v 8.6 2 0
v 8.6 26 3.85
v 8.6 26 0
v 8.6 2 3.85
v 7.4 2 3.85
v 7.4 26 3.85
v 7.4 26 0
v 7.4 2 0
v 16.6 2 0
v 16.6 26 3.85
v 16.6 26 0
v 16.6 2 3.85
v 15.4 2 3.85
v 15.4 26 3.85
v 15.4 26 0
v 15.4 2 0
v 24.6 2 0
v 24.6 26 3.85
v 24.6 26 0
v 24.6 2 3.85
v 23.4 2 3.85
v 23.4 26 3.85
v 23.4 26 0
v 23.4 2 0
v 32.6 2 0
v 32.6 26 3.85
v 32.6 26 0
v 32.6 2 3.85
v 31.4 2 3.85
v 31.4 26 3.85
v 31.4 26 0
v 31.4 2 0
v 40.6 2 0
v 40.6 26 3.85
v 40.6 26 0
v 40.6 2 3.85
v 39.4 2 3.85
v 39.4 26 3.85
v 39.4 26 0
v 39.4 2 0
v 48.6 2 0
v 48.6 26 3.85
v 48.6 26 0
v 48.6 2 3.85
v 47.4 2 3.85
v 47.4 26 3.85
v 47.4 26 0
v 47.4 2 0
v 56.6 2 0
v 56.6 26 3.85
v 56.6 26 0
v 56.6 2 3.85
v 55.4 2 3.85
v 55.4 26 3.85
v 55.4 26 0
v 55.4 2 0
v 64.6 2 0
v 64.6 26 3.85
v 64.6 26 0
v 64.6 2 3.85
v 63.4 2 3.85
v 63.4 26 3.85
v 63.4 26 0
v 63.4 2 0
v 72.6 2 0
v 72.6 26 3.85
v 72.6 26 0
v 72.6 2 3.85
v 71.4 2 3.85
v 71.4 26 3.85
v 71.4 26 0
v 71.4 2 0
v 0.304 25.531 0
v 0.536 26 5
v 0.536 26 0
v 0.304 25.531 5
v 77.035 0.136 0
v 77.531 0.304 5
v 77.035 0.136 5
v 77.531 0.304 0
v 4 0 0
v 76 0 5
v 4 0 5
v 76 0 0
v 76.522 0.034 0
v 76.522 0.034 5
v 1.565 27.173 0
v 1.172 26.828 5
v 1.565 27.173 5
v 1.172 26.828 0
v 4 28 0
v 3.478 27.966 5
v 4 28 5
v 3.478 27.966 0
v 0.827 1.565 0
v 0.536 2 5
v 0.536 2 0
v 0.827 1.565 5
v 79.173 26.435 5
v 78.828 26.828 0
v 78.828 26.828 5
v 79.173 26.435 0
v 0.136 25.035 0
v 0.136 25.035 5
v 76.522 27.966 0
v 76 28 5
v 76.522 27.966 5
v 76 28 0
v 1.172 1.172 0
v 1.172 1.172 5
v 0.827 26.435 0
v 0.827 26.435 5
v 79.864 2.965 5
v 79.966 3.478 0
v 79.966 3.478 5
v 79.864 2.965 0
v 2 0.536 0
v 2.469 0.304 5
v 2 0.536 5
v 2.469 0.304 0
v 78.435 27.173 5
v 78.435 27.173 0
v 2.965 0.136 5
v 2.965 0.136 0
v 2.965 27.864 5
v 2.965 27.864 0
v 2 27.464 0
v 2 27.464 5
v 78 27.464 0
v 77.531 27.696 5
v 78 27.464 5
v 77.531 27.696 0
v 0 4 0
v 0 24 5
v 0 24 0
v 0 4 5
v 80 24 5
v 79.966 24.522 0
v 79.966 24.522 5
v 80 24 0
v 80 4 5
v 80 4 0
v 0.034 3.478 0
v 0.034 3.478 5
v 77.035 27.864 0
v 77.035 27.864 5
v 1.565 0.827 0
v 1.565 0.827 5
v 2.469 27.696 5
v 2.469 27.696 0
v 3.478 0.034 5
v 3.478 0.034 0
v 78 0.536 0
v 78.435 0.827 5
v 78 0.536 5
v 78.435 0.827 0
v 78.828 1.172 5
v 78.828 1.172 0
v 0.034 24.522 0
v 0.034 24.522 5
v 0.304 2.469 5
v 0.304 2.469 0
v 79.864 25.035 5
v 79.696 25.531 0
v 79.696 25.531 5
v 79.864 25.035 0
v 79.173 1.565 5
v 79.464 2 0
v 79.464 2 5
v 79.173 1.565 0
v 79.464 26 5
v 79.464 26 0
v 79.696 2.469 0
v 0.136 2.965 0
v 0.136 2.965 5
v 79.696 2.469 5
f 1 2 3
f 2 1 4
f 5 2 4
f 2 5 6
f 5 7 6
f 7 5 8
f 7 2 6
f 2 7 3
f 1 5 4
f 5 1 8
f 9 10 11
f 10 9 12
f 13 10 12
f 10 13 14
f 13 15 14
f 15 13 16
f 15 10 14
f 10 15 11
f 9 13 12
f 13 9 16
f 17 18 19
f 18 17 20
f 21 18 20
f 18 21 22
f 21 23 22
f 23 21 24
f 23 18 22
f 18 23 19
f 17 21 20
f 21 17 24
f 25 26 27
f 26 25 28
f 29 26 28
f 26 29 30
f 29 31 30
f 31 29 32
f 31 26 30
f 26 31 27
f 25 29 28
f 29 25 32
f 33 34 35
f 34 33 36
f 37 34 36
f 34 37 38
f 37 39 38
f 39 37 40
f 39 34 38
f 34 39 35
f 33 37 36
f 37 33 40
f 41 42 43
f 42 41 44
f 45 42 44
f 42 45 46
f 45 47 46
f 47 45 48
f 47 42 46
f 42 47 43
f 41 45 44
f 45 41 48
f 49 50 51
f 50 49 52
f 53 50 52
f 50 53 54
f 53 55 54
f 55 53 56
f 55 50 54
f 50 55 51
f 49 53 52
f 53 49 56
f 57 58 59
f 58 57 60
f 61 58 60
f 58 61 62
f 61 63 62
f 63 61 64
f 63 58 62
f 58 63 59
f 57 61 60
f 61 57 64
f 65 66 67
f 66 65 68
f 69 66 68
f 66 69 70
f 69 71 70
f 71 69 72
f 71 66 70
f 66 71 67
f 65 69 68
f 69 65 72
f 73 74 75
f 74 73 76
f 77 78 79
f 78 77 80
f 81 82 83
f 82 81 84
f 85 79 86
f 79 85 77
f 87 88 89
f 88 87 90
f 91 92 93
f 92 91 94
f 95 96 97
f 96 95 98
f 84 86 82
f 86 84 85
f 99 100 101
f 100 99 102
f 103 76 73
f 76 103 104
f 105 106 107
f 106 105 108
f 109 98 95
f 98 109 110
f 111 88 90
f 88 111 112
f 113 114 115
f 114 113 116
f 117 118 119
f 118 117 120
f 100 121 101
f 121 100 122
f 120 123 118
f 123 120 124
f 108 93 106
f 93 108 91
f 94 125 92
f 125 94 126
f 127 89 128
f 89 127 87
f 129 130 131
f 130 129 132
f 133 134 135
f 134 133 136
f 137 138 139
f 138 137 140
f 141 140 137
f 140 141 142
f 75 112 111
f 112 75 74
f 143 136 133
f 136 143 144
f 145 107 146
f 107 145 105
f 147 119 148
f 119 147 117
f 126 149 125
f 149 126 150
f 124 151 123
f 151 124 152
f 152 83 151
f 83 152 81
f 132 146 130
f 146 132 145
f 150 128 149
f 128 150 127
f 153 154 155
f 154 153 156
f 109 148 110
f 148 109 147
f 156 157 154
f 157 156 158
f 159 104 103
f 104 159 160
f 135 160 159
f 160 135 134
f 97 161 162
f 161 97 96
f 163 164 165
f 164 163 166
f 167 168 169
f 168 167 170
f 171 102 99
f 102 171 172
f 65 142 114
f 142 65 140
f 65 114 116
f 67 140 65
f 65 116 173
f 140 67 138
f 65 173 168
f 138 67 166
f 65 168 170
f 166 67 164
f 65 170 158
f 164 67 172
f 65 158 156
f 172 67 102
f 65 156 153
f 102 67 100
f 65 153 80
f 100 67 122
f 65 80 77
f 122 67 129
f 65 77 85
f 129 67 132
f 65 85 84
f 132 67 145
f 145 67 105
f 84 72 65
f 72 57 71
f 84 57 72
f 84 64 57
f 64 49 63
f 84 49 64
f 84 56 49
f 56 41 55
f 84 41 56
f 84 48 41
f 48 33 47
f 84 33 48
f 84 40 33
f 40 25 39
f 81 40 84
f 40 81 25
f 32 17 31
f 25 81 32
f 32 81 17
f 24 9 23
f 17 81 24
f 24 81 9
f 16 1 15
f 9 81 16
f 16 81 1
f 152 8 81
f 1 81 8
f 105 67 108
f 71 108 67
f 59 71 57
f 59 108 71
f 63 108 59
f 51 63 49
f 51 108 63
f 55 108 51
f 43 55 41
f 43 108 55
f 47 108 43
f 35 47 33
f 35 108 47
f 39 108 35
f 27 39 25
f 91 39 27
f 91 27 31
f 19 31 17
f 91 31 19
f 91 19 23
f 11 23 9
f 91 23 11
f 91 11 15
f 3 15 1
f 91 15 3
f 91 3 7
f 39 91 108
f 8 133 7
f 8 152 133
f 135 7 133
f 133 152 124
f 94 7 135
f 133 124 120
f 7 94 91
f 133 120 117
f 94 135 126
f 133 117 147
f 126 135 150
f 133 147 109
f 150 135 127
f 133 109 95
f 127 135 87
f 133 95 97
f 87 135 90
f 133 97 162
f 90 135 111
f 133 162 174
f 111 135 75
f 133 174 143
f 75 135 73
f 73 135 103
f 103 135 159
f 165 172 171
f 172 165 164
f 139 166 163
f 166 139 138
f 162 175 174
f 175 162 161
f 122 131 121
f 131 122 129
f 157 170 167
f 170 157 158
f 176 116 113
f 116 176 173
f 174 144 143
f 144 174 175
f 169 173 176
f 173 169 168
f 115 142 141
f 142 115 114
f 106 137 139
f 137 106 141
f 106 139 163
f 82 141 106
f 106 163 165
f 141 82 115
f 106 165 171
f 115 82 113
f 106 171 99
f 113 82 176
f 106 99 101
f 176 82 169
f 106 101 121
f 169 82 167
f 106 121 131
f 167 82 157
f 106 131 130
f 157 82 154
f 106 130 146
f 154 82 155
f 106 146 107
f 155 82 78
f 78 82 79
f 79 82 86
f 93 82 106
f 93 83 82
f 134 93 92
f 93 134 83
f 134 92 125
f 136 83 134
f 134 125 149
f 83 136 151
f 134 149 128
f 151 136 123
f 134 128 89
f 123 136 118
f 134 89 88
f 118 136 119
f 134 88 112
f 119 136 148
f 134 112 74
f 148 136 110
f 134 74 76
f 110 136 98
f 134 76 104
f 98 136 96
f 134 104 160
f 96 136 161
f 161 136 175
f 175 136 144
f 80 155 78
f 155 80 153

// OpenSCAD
// file: ../latches/magnetic.scad
// latches/magnetic.scad — small puck on each band end holding a glued-in
// 6 mm × 2 mm neodymium disc magnet.
// MIT licensed.
//
// Convention: end="left" places a puck at origin extending +X into the band
// (centered at MAGNET_POCKET_INSET from x=0); end="right" places a puck
// extending -X from origin (centered at -MAGNET_POCKET_INSET). The caller
// translates the right invocation to band_length so it sits inside the band's
// right end.
//
// Print orientation: pocket opens UP (toward +Z) so the magnet drops in from
// above. The user glues with cyanoacrylate. Polarity is the user's
// responsibility — mark each magnet before gluing because you cannot reverse
// it once cured.

MAGNET_DIAMETER     = 6;     // mm
MAGNET_THICKNESS    = 2;     // mm
MAGNET_TOLERANCE    = 0.3;   // mm of slack so the magnet drops in cleanly
MAGNET_PUCK_R       = 5.5;   // mm — puck around the pocket
MAGNET_PUCK_HEIGHT  = 2.6;   // mm above the band
MAGNET_PUCK_INSET   = 8;     // mm — puck center from the band end

module _magnet_puck(band_thickness) {
    // puck sits ON TOP of the band at z = band_thickness, with a downward-
    // opening cylinder removed for the magnet (opening on the puck's TOP face
    // because the puck sits proud of the band — the pocket can open up
    // without breaching the band).
    difference() {
        translate([0, 0, band_thickness])
            cylinder(h = MAGNET_PUCK_HEIGHT, r = MAGNET_PUCK_R);
        // pocket opens at the top of the puck, sunk down to leave a thin floor
        floor_thickness = max(MAGNET_PUCK_HEIGHT - MAGNET_THICKNESS, 0.4);
        translate([0, 0, band_thickness + floor_thickness])
            cylinder(h = MAGNET_THICKNESS + 0.1,
                     d = MAGNET_DIAMETER + MAGNET_TOLERANCE);
    }
}

module latch_magnetic(band_width, band_thickness, end = "both") {
    if (end == "left" || end == "both") {
        translate([MAGNET_PUCK_INSET, band_width / 2, 0])
            _magnet_puck(band_thickness);
    }
    if (end == "right" || end == "both") {
        translate([-MAGNET_PUCK_INSET, band_width / 2, 0])
            _magnet_puck(band_thickness);
    }
}

latch_magnetic(22, 3);
// file: ../latches/friction_overlap.scad
// latches/friction_overlap.scad — no hardware, ends overlap and TPU-on-TPU grip
// holds.
// MIT licensed.
//
// Adds a small taper at both ends (thinner) so the overlap zone doesn't
// double the wrist's wrap diameter visibly. Adjustable by sliding.

module latch_friction_overlap(band_width, band_thickness) {
    taper_l = 18;  // mm of taper into each end

    // left end taper: shrink to half thickness over taper_l
    translate([0, 0, 0])
        rotate([0, 0, 180])
            linear_extrude(height = band_thickness, scale = [0.6, 1.0])
                square([0.01, band_width], center = false);

    // The above is just a visual hint — the actual taper is handled by the
    // band itself; this module is intentionally minimal because friction
    // overlap requires NO added hardware.
}

// development render
latch_friction_overlap(22, 3);
// file: ../latches/loop_post.scad
// latches/loop_post.scad — loop frame on one end, T-post on the other.
// MIT licensed.
//
// Convention: end="left" places a small T-headed post UP from the band's top
// surface at x=0; end="right" places a loop-frame extending +X past the
// band end. When worn, the loop-frame slips over the T-post and the post's
// head captures it.

LOOP_POST_DIAMETER     = 5;     // mm — post shaft diameter
LOOP_POST_HEIGHT       = 7;     // mm — post total height
LOOP_POST_HEAD_R       = 4;     // mm — T-head radius (wider than shaft so the loop is captured)
LOOP_FRAME_LENGTH      = 18;    // mm — frame extends past band end
LOOP_FRAME_INNER_W     = 8;     // mm — inner cutout width (must clear post head)
LOOP_FRAME_INNER_L     = 10;    // mm — inner cutout length
LOOP_FRAME_WALL        = 2.5;   // mm

module latch_loop_post(band_width, band_thickness, end = "both") {
    if (end == "left" || end == "both") {
        // T-headed post centered on the band's top surface near x = 0
        translate([0, band_width / 2, band_thickness]) {
            cylinder(h = LOOP_POST_HEIGHT - 1.2, d = LOOP_POST_DIAMETER);
            translate([0, 0, LOOP_POST_HEIGHT - 1.2])
                cylinder(h = 1.2,
                         r1 = LOOP_POST_DIAMETER / 2,
                         r2 = LOOP_POST_HEAD_R);
        }
    }
    if (end == "right" || end == "both") {
        // Loop frame extending +X past the band end
        frame_w = band_width * 0.8;
        translate([0, (band_width - frame_w) / 2, 0])
            difference() {
                // outer rounded-rect
                linear_extrude(height = band_thickness)
                    offset(r = 3) offset(delta = -3)
                        square([LOOP_FRAME_LENGTH, frame_w]);
                // inner cutout for the loop
                translate([
                    (LOOP_FRAME_LENGTH - LOOP_FRAME_INNER_L) / 2,
                    (frame_w - LOOP_FRAME_INNER_W) / 2,
                    -0.1
                ])
                    linear_extrude(height = band_thickness + 0.2)
                        offset(r = 1.5) offset(delta = -1.5)
                            square([LOOP_FRAME_INNER_L, LOOP_FRAME_INNER_W]);
            }
    }
}

latch_loop_post(22, 3);
// file: ../latches/snap.scad
// latches/snap.scad — printed peg-and-socket snap closure.
// MIT licensed.
//
// Convention: end="left" extends in -X from origin; end="right" extends in +X.
// Caller places at x=0 for left and translates to band_length for right.
//
// Both ends have a flat tab extending past the band edge. The LEFT tab has
// a small peg pointing up; the RIGHT tab has a matching socket on its
// underside. When worn, the right tab lays on top of the left tab and the
// peg snaps into the socket.

SNAP_TAB_LENGTH    = 14;   // mm — how far the tab extends past the band
SNAP_PEG_DIAMETER  = 4;    // mm
SNAP_PEG_HEIGHT    = 2.5;  // mm — pegs head sticks above the tab top
SNAP_PEG_HEAD_R    = 2.6;  // mm — flared head, slightly wider than the shaft

module _snap_tab(band_width, band_thickness, direction) {
    // direction = -1 for left (extends -X) or +1 for right (extends +X)
    tab_w = band_width * 0.7;
    x0 = direction == -1 ? -SNAP_TAB_LENGTH : 0;
    translate([x0, (band_width - tab_w) / 2, 0])
        linear_extrude(height = band_thickness)
            offset(r = 3) offset(delta = -3)
                square([SNAP_TAB_LENGTH, tab_w]);
}

module latch_snap(band_width, band_thickness, end = "both") {
    if (end == "left" || end == "both") {
        // tab extends -X
        _snap_tab(band_width, band_thickness, direction = -1);
        // peg pointing up at the tab's tip
        translate([-SNAP_TAB_LENGTH * 0.65, band_width / 2, band_thickness])
            union() {
                cylinder(h = SNAP_PEG_HEIGHT * 0.7, d = SNAP_PEG_DIAMETER);
                translate([0, 0, SNAP_PEG_HEIGHT * 0.7])
                    cylinder(h = SNAP_PEG_HEIGHT * 0.3,
                             r1 = SNAP_PEG_DIAMETER / 2,
                             r2 = SNAP_PEG_HEAD_R);
            }
    }
    if (end == "right" || end == "both") {
        // tab extends +X, with a socket cavity in the underside at the tip
        difference() {
            _snap_tab(band_width, band_thickness, direction = +1);
            // socket: cylindrical cavity sized slightly larger than the peg
            // head, opening downward from z=0 (underside of the tab)
            translate([SNAP_TAB_LENGTH * 0.65, band_width / 2, -0.01])
                cylinder(h = band_thickness * 0.7,
                         d = SNAP_PEG_HEAD_R * 2 + 0.4);
        }
    }
}

latch_snap(22, 3);
// file: ../latches/buckle.scad
// latches/buckle.scad — pin-through-hole buckle, leather-bracelet authentic.
// MIT licensed.
//
// One end gets the frame + pin; the other end gets a tongue with a row of
// holes. Caller invokes once at each end with end="left" or end="right".
//
// LEARNING-MODE NOTE: hole count and spacing is a UX call. Defaults below
// give 5 holes at 5 mm spacing => 20 mm of size adjustability. Goth subculture
// tends to want fewer, wider holes; festival use wants more, tighter holes.
// To tune, change BUCKLE_HOLES and BUCKLE_HOLE_SPACING. If you change them,
// also update src/open_studs/params.py to match (drift test will fail
// otherwise once Push 2 lands).

BUCKLE_HOLES         = 5;     // count of adjustment holes
BUCKLE_HOLE_SPACING  = 5;     // mm center-to-center
BUCKLE_HOLE_DIAMETER = 3.5;   // mm — sized to the printed pin
BUCKLE_PIN_DIAMETER  = 3.2;   // mm — slightly under hole for friction
BUCKLE_FRAME_LENGTH  = 12;    // mm — length of the buckle frame
BUCKLE_TONGUE_LENGTH = 35;    // mm — length of the tongue past the band

module latch_buckle(band_width, band_thickness, end = "both") {
    if (end == "left" || end == "both")  buckle_frame(band_width, band_thickness);
    if (end == "right" || end == "both") buckle_tongue(band_width, band_thickness);
}

module buckle_frame(band_width, band_thickness) {
    // a rectangular frame sitting at x=0, extending into -X by BUCKLE_FRAME_LENGTH.
    // pin runs across in Y.
    frame_w = band_width + 4;
    frame_l = BUCKLE_FRAME_LENGTH;
    wall    = 2.5;
    bar_d   = BUCKLE_PIN_DIAMETER;

    translate([-frame_l, -2, 0]) {
        difference() {
            // outer block
            cube([frame_l, frame_w, band_thickness]);
            // inner cutout
            translate([wall, wall, -0.1])
                cube([frame_l - 2 * wall, frame_w - 2 * wall, band_thickness + 0.2]);
        }
        // pin bar across the middle
        translate([frame_l / 2, 0, band_thickness / 2])
            rotate([-90, 0, 0])
                cylinder(h = frame_w, d = bar_d, $fn = 24);
    }
}

module buckle_tongue(band_width, band_thickness) {
    // a tongue at x=0 (right end of band) extending +X by BUCKLE_TONGUE_LENGTH,
    // with BUCKLE_HOLES holes punched through.
    tongue_w = band_width * 0.7;
    tongue_l = BUCKLE_TONGUE_LENGTH;

    difference() {
        translate([0, (band_width - tongue_w) / 2, 0])
            linear_extrude(height = band_thickness)
                offset(r = 3) offset(delta = -3)
                    square([tongue_l, tongue_w]);

        // adjustment holes, centered on the tongue, spaced from the band end
        hole_start = 10;
        for (i = [0 : BUCKLE_HOLES - 1])
            translate([hole_start + i * BUCKLE_HOLE_SPACING, band_width / 2, -0.1])
                cylinder(h = band_thickness + 0.2, d = BUCKLE_HOLE_DIAMETER);
    }
}

// development render — show the frame end on a stub of band so you can see
// how it sits.
*latch_buckle(22, 3, end = "both");
translate([0, 0, 0]) cube([60, 22, 3]);  // visible band stub
latch_buckle(22, 3, end = "left");
translate([60, 0, 0]) latch_buckle(22, 3, end = "right");
// file: ../patterns/gradient_size.scad
// patterns/gradient_size.scad — studs that grow/shrink along the band.
// MIT licensed.
//
// STUB. Signature locked; this pattern needs the position list to carry size
// info too (currently it only returns [x, y]). Likely a future-extension to
// allow [x, y, size_scale]. For now returns empty so bracelet still compiles.

function pattern_gradient_size(band_length, band_width, rows = 1, spacing = undef) =
    [];  // TODO: extend signature to carry per-stud size scale
// file: ../patterns/cluster.scad
// patterns/cluster.scad — small groups of studs with empty space between.
// MIT licensed.
//
// STUB. Signature locked; cluster topology TBD. Returns an empty list for now
// so the bracelet still compiles when this pattern is selected.

function pattern_cluster(band_length, band_width, rows = 1, spacing = undef) =
    [];  // TODO: design cluster topology
// file: ../patterns/staggered.scad
// patterns/staggered.scad — two rows offset by half a step. The classic
// double-row punk look.
// MIT licensed.

LATCH_MARGIN = 25;
STAGGERED_DEFAULT_SPACING = 12;
STAGGERED_INSET = 0.28;

function _staggered_spacing(band_length, spacing) =
    is_undef(spacing) ?
        (band_length - 2 * LATCH_MARGIN) /
            max(1, floor((band_length - 2 * LATCH_MARGIN) / STAGGERED_DEFAULT_SPACING))
        : spacing;

function _staggered_count(band_length, spacing) =
    floor((band_length - 2 * LATCH_MARGIN) / _staggered_spacing(band_length, spacing)) + 1;

function pattern_staggered(band_length, band_width, rows = 2, spacing = undef) =
    let (
        s  = _staggered_spacing(band_length, spacing),
        n  = _staggered_count(band_length, spacing),
        half = s / 2,
        y1 = band_width * (0.5 - STAGGERED_INSET),
        y2 = band_width * (0.5 + STAGGERED_INSET)
    )
    concat(
        [ for (i = [0 : n - 1]) [LATCH_MARGIN + i * s, y1] ],
        [ for (i = [0 : n - 2]) [LATCH_MARGIN + half + i * s, y2] ]
    );
// file: ../patterns/double_row.scad
// patterns/double_row.scad — two parallel rows, evenly spaced.
// MIT licensed.

LATCH_MARGIN = 25;
DOUBLE_ROW_DEFAULT_SPACING = 12;
DOUBLE_ROW_INSET = 0.28;  // fraction of band width to inset each row from center

function _double_row_spacing(band_length, spacing) =
    is_undef(spacing) ?
        (band_length - 2 * LATCH_MARGIN) /
            max(1, floor((band_length - 2 * LATCH_MARGIN) / DOUBLE_ROW_DEFAULT_SPACING))
        : spacing;

function _double_row_count(band_length, spacing) =
    floor((band_length - 2 * LATCH_MARGIN) / _double_row_spacing(band_length, spacing)) + 1;

function pattern_double_row(band_length, band_width, rows = 2, spacing = undef) =
    let (
        s = _double_row_spacing(band_length, spacing),
        n = _double_row_count(band_length, spacing),
        y1 = band_width * (0.5 - DOUBLE_ROW_INSET),
        y2 = band_width * (0.5 + DOUBLE_ROW_INSET)
    )
    concat(
        [ for (i = [0 : n - 1]) [LATCH_MARGIN + i * s, y1] ],
        [ for (i = [0 : n - 1]) [LATCH_MARGIN + i * s, y2] ]
    );
// file: ../patterns/single_row.scad
// patterns/single_row.scad — evenly-spaced studs along the centerline.
// MIT licensed.
//
// LEARNING-MODE NOTE: spacing strategy is a UX call. We auto-fit: pick the
// number of studs that fits with at least 25 mm of margin at each end (for
// the latch), spaced evenly. Alternative: fixed mm spacing, accept the
// leftover gap. To switch, set `spacing` explicitly when calling.

LATCH_MARGIN              = 25;  // mm at each end
SINGLE_ROW_DEFAULT_SPACING = 12; // mm — used when auto-fit yields nothing

function _single_row_spacing(band_length, spacing) =
    is_undef(spacing) ?
        // auto-fit: aim for ~12 mm spacing, round to fit cleanly
        (band_length - 2 * LATCH_MARGIN) /
            max(1, floor((band_length - 2 * LATCH_MARGIN) / SINGLE_ROW_DEFAULT_SPACING))
        : spacing;

function _single_row_count(band_length, spacing) =
    floor((band_length - 2 * LATCH_MARGIN) / _single_row_spacing(band_length, spacing)) + 1;

function pattern_single_row(band_length, band_width, rows = 1, spacing = undef) =
    let (
        s = _single_row_spacing(band_length, spacing),
        n = _single_row_count(band_length, spacing),
        y = band_width / 2
    )
    [ for (i = [0 : n - 1]) [LATCH_MARGIN + i * s, y] ];
// file: ../studs/lightning.scad
// studs/lightning.scad — zigzag bolt.
// MIT licensed.
//
// Festival/cyberpunk set. A flash-of-lightning silhouette extruded low.

module stud_lightning(size = 6, tip_radius = 0.4, height = undef) {
    h = is_undef(height) ? size * 0.35 : height;
    // 6-point polygon making a stylized bolt; coords scaled to fit
    // within [-size/2, size/2] in both axes.
    s = size / 2;
    points = [
        [-0.15 * s,  1.00 * s],
        [ 0.55 * s,  0.10 * s],
        [ 0.05 * s,  0.10 * s],
        [ 0.45 * s, -1.00 * s],
        [-0.35 * s, -0.10 * s],
        [ 0.10 * s, -0.10 * s],
    ];

    if (tip_radius > 0) {
        linear_extrude(height = h)
            offset(r = tip_radius)
                offset(delta = -tip_radius)
                    polygon(points);
    } else {
        linear_extrude(height = h)
            polygon(points);
    }
}

stud_lightning(size = 12);
// file: ../studs/heart.scad
// studs/heart.scad — geometric heart.
// MIT licensed.
//
// Festival set. Two overlapping circles for the lobes + a downward triangle
// for the point. The kawaii option; pairs with pastel TPU.

module stud_heart(size = 6, tip_radius = 0.4, height = undef) {
    h = is_undef(height) ? size * 0.35 : height;
    // Each circle has radius size/4 and sits at the upper-left / upper-right
    // of the bounding box. The triangle apex is at the bottom center.
    lobe_r = size / 4;
    lobe_y =  size / 4;
    lobe_x =  size / 4;

    linear_extrude(height = h)
        union() {
            translate([-lobe_x, lobe_y]) circle(r = lobe_r);
            translate([ lobe_x, lobe_y]) circle(r = lobe_r);
            polygon([
                [-size / 2 - 0.01, lobe_y],
                [ size / 2 + 0.01, lobe_y],
                [ 0,              -size / 2]
            ]);
        }
}

stud_heart(size = 10);
// file: ../studs/star.scad
// studs/star.scad — 5-pointed star.
// MIT licensed.
//
// Festival set. Polygon star linear_extruded to a low profile. `tip_radius`
// softens the tips so they don't stab through clothing.

module stud_star(size = 6, tip_radius = 0.4, height = undef) {
    h = is_undef(height) ? size * 0.35 : height;
    outer_r = size / 2;
    // 5-point star: alternating outer/inner radii at 10 angles.
    inner_r = outer_r * 0.42;
    points = [
        for (i = [0 : 9]) let (
            angle = i * 36 - 90,         // start pointing up
            r = (i % 2 == 0) ? outer_r : inner_r
        ) [r * cos(angle), r * sin(angle)]
    ];

    if (tip_radius > 0) {
        // Round the tips by offsetting in and back out.
        linear_extrude(height = h)
            offset(r = tip_radius)
                offset(delta = -tip_radius)
                    polygon(points);
    } else {
        linear_extrude(height = h)
            polygon(points);
    }
}

stud_star(size = 10);
// file: ../studs/washer.scad
// studs/washer.scad — flat ring with a through-hole.
// MIT licensed.
//
// Industrial set. The "negative space" stud — when massed, reads as a row of
// loose washers riveted to the band. Pairs especially well with multi-color
// prints where the hole exposes a different layer color.

module stud_washer(size = 6, tip_radius = 0.4, height = undef) {
    h        = is_undef(height) ? size * 0.25 : height;
    outer_r  = size / 2;
    inner_r  = size * 0.30;
    fillet   = min(tip_radius, h * 0.4);

    difference() {
        if (fillet > 0) {
            minkowski() {
                cylinder(h = max(h - fillet, 0.01), r = outer_r - fillet);
                sphere(r = fillet, $fn = 16);
            }
        } else {
            cylinder(h = h, r = outer_r);
        }
        // through-hole; small overlap so the boolean is clean
        translate([0, 0, -0.1])
            cylinder(h = h + 0.2, r = inner_r);
    }
}

stud_washer(size = 10);
// file: ../studs/hex_bolt.scad
// studs/hex_bolt.scad — hex head, like a real bolt sticking up.
// MIT licensed.
//
// Industrial set. The hex shape is achieved via cylinder($fn=6); tip_radius
// chamfers the top edge.

module stud_hex_bolt(size = 6, tip_radius = 0.4, height = undef) {
    h = is_undef(height) ? size * 0.5 : height;

    // Hex head: cylinder with 6 facets, sized so the flat-to-flat distance
    // equals `size`.
    r = size / sqrt(3);  // outer radius for flat-to-flat = size

    if (tip_radius > 0) {
        // Chamfer the top edge by minkowski-summing the top portion with a
        // small sphere. Keeps the bottom crisp where it meets the band.
        union() {
            cylinder(h = h - tip_radius, r = r, $fn = 6);
            translate([0, 0, h - tip_radius])
                minkowski() {
                    cylinder(h = 0.01, r = r - tip_radius, $fn = 6);
                    sphere(r = tip_radius, $fn = 16);
                }
        }
    } else {
        cylinder(h = h, r = r, $fn = 6);
    }
}

stud_hex_bolt(size = 8, tip_radius = 0.4);
// file: ../studs/rivet.scad
// studs/rivet.scad — rounded button rivet, like a tiny mushroom cap.
// MIT licensed.
//
// Industrial set. Looks like a smashed-flat ball bearing. Low profile,
// reads as "loose hardware" in mass on a band.

module stud_rivet(size = 6, tip_radius = 0.4, height = undef) {
    h = is_undef(height) ? size * 0.4 : height;

    // Body: short cylinder with a domed top. The dome is half a flattened
    // sphere intersected with the cap region so it doesn't peak too high.
    cyl_h = h * 0.6;
    dome_h = h * 0.4;

    union() {
        cylinder(h = cyl_h, r = size / 2);
        translate([0, 0, cyl_h]) {
            intersection() {
                scale([1, 1, dome_h / (size / 2)])
                    sphere(r = size / 2, $fn = 32);
                cylinder(h = dome_h, r = size / 2);
            }
        }
    }
}

stud_rivet(size = 8);
// file: ../studs/screw_head.scad
// studs/screw_head.scad — flat round disc with a slot. Industrial look.
// MIT licensed.

module stud_screw_head(size = 6, tip_radius = 0.4, height = undef) {
    h         = is_undef(height) ? size * 0.25 : height;
    slot_w    = size * 0.15;
    slot_d    = h * 0.4;
    fillet    = min(tip_radius, h * 0.3);

    difference() {
        // disc with a small chamfered top edge if tip_radius > 0
        if (fillet > 0) {
            minkowski() {
                cylinder(h = h - fillet, r = size / 2 - fillet);
                sphere(r = fillet);
            }
        } else {
            cylinder(h = h, r = size / 2);
        }
        // slot
        translate([-size / 2, -slot_w / 2, h - slot_d])
            cube([size, slot_w, slot_d + 0.1]);
    }
}

stud_screw_head(size = 10, tip_radius = 0.5);
// file: ../studs/flat_pyramid.scad
// studs/flat_pyramid.scad — low-profile pyramid for daily wear.
// MIT licensed.
//
// Same geometry as `stud_pyramid` but ~40% of the height — sits closer to
// the band so it doesn't catch on clothing.

use <pyramid.scad>

module stud_flat_pyramid(size = 6, tip_radius = 0.4, height = undef) {
    h = is_undef(height) ? size * 0.4 : height;
    stud_pyramid(size = size, tip_radius = tip_radius, height = h);
}

stud_flat_pyramid(size = 8, tip_radius = 0.4);
// file: ../studs/diamond.scad
// studs/diamond.scad — bipyramid (two pyramids base-to-base).
// MIT licensed.
//
// The widest cross-section sits halfway up; tip and base are both points
// (or flattened by tip_radius). Reads more "gem" than "punk" — both have
// their moments.

module stud_diamond(size = 6, tip_radius = 0.4, height = undef) {
    h = is_undef(height) ? size * 1.4 : height;
    base_r = (size / 2) * sqrt(2);
    top_r  = tip_radius > 0 ? tip_radius * sqrt(2) : 0;

    rotate([0, 0, 45])
        union() {
            // lower half: point at z=0, widest at z=h/2
            cylinder(h = h / 2, r1 = top_r, r2 = base_r, $fn = 4);
            // upper half: widest at z=h/2, point at z=h
            translate([0, 0, h / 2])
                cylinder(h = h / 2, r1 = base_r, r2 = top_r, $fn = 4);
        }
}

stud_diamond(size = 8, tip_radius = 0.4);
// file: ../studs/long_spike.scad
// studs/long_spike.scad — the dramatic one.
// MIT licensed.
//
// Tall cone spike. ~2.5x size by default. Set tip_radius = 0 for the full
// "do not approach me at the show" aesthetic, ~0.4 for "I'd like to keep my
// eye."

module stud_long_spike(size = 6, tip_radius = 0.4, height = undef) {
    h = is_undef(height) ? size * 2.5 : height;
    cylinder(h = h, r1 = size / 2, r2 = max(tip_radius, 0.001));
}

stud_long_spike(size = 8, tip_radius = 0.4);
// file: ../studs/cone_spike.scad
// studs/cone_spike.scad — round-base cone spike.
// MIT licensed.

module stud_cone_spike(size = 6, tip_radius = 0.4, height = undef) {
    h = is_undef(height) ? size * 1.2 : height;
    cylinder(h = h, r1 = size / 2, r2 = max(tip_radius, 0.001));
}

stud_cone_spike(size = 8, tip_radius = 0.4);
// file: ../studs/dome.scad
// studs/dome.scad — half-sphere stud.
// MIT licensed.

module stud_dome(size = 6, tip_radius = 0.4, height = undef) {
    // `size` is the base diameter; `tip_radius` is unused for a dome
    // (the dome is naturally rounded). `height` defaults to a half-sphere.
    r = size / 2;
    h = is_undef(height) ? r : height;

    intersection() {
        sphere(r = r);
        translate([-r, -r, 0]) cube([size, size, h]);
    }
}

stud_dome(size = 8);
// file: ../studs/pyramid.scad
// studs/pyramid.scad — classic 4-sided pyramid.
// MIT licensed.
//
// Module contract (see CONTRIBUTING.md):
//   stud_pyramid(size, tip_radius, height)
//   - origin at base center, axis along +Z, base on z=0
//
// LEARNING-MODE NOTE: there are three reasonable ways to build a pyramid in
// OpenSCAD. We use `cylinder($fn=4)` because tip_radius drops in cleanly as
// the top radius. Alternatives if you want to revisit:
//   (a) polyhedron with explicit vertices  — most control, no fillet support
//   (b) hull() over a square base and a point — clean, harder to flatten tip
//   (c) minkowski() of (a) with a small sphere — true fillet, slow render

module stud_pyramid(size = 6, tip_radius = 0.4, height = undef) {
    h = is_undef(height) ? size : height;

    // cylinder $fn=4 produces a 4-sided prism. To make the *corners* sit at
    // x=±size/2 and y=±size/2, the base radius must be (size/2)*sqrt(2).
    base_r = (size / 2) * sqrt(2);
    top_r  = tip_radius > 0 ? tip_radius * sqrt(2) : 0;

    rotate([0, 0, 45])
        cylinder(h = h, r1 = base_r, r2 = top_r, $fn = 4);
}

// development render
stud_pyramid(size = 8, tip_radius = 0.4);
// file: ../core/latch.scad
// core/latch.scad — closure assembly dispatch.
// MIT licensed. See LICENSE-MIT.

include <config.scad>

use <../latches/buckle.scad>
use <../latches/snap.scad>
use <../latches/loop_post.scad>
use <../latches/friction_overlap.scad>
use <../latches/magnetic.scad>

// Each latch owns its left/right geometry. The assembly places the left side
// at x=0 and the right side at x=band_length when the latch needs two calls.

module place_latch(name, band_width, band_thickness, band_length) {
    if      (name == "buckle")            _place_two_ended(name, band_width, band_thickness, band_length);
    else if (name == "snap")              _place_two_ended(name, band_width, band_thickness, band_length);
    else if (name == "loop_post")         _place_two_ended(name, band_width, band_thickness, band_length);
    else if (name == "friction_overlap")  _place_two_ended(name, band_width, band_thickness, band_length);
    else if (name == "magnetic")          _place_two_ended(name, band_width, band_thickness, band_length);
    else if (name == "none") { /* no latch */ }
    else echo(str("WARN: unknown latch '", name, "'"));
}

module _place_two_ended(name, band_width, band_thickness, band_length) {
    if      (name == "buckle") {
        latch_buckle(band_width, band_thickness, end = "left");
        translate([band_length, 0, 0])
            latch_buckle(band_width, band_thickness, end = "right");
    }
    else if (name == "snap") {
        latch_snap(band_width, band_thickness, end = "left");
        translate([band_length, 0, 0])
            latch_snap(band_width, band_thickness, end = "right");
    }
    else if (name == "loop_post") {
        latch_loop_post(band_width, band_thickness, end = "left");
        translate([band_length, 0, 0])
            latch_loop_post(band_width, band_thickness, end = "right");
    }
    else if (name == "friction_overlap") {
        latch_friction_overlap(band_width, band_thickness);
    }
    else if (name == "magnetic") {
        latch_magnetic(band_width, band_thickness, end = "left");
        translate([band_length, 0, 0])
            latch_magnetic(band_width, band_thickness, end = "right");
    }
}

module bracelet_latch_from_config(latch_cfg, band_cfg) {
    place_latch(
        latch_cfg_type(latch_cfg),
        band_cfg_width(band_cfg),
        band_cfg_thickness(band_cfg),
        band_cfg_length(band_cfg)
    );
}
// file: ../core/surface.scad
// core/surface.scad — top-side design and attachment cutouts.
// MIT licensed. See LICENSE-MIT.

include <config.scad>

use <../studs/pyramid.scad>
use <../studs/dome.scad>
use <../studs/cone_spike.scad>
use <../studs/long_spike.scad>
use <../studs/diamond.scad>
use <../studs/flat_pyramid.scad>
use <../studs/screw_head.scad>
use <../studs/rivet.scad>
use <../studs/hex_bolt.scad>
use <../studs/washer.scad>
use <../studs/star.scad>
use <../studs/heart.scad>
use <../studs/lightning.scad>

use <../patterns/single_row.scad>
use <../patterns/double_row.scad>
use <../patterns/staggered.scad>
use <../patterns/cluster.scad>
use <../patterns/gradient_size.scad>

// --- dispatch --------------------------------------------------------------

module place_stud(name, size, tip_radius) {
    if      (name == "pyramid")       stud_pyramid(size, tip_radius);
    else if (name == "dome")          stud_dome(size, tip_radius);
    else if (name == "cone_spike")    stud_cone_spike(size, tip_radius);
    else if (name == "long_spike")    stud_long_spike(size, tip_radius);
    else if (name == "diamond")       stud_diamond(size, tip_radius);
    else if (name == "flat_pyramid")  stud_flat_pyramid(size, tip_radius);
    else if (name == "screw_head")    stud_screw_head(size, tip_radius);
    else if (name == "rivet")         stud_rivet(size, tip_radius);
    else if (name == "hex_bolt")      stud_hex_bolt(size, tip_radius);
    else if (name == "washer")        stud_washer(size, tip_radius);
    else if (name == "star")          stud_star(size, tip_radius);
    else if (name == "heart")         stud_heart(size, tip_radius);
    else if (name == "lightning")     stud_lightning(size, tip_radius);
    else echo(str("WARN: unknown stud_module '", name, "'"));
}

function pattern_positions(name, band_length, band_width, rows, spacing) =
      name == "single_row"    ? pattern_single_row(band_length, band_width, rows, spacing)
    : name == "double_row"    ? pattern_double_row(band_length, band_width, rows, spacing)
    : name == "staggered"     ? pattern_staggered(band_length, band_width, rows, spacing)
    : name == "cluster"       ? pattern_cluster(band_length, band_width, rows, spacing)
    : name == "gradient_size" ? pattern_gradient_size(band_length, band_width, rows, spacing)
    : [];

function surface_positions(cfg, band_length, band_width) =
    pattern_positions(
        surface_cfg_pattern(cfg),
        band_length,
        band_width,
        surface_cfg_rows(cfg),
        surface_cfg_spacing(cfg)
    );

function surface_position_is_clear(p, band_length, latch_clearance) =
    p[0] > latch_clearance && p[0] < band_length - latch_clearance;

function surface_socket_diameter(cfg) =
    is_undef(surface_cfg_socket_diameter(cfg)) ?
        surface_cfg_stud_size(cfg) * 0.5 :
        surface_cfg_socket_diameter(cfg);

// --- positive top design ---------------------------------------------------

module bracelet_surface_from_config(surface_cfg, band_cfg, latch_cfg) {
    mode = surface_cfg_mode(surface_cfg);
    length = band_cfg_length(band_cfg);
    width = band_cfg_width(band_cfg);
    thickness = band_cfg_thickness(band_cfg);
    latch_clearance = latch_cfg_clearance(latch_cfg);
    positions = surface_positions(surface_cfg, length, width);

    if (mode == "integral")
        for (p = positions)
            if (surface_position_is_clear(p, length, latch_clearance))
                translate([p[0], p[1], thickness])
                    place_stud(
                        surface_cfg_stud_module(surface_cfg),
                        surface_cfg_stud_size(surface_cfg),
                        surface_cfg_tip_radius(surface_cfg)
                    );
}

// --- negative attachment features -----------------------------------------

module bracelet_surface_cutouts_from_config(surface_cfg, band_cfg, latch_cfg) {
    mode = surface_cfg_mode(surface_cfg);
    length = band_cfg_length(band_cfg);
    width = band_cfg_width(band_cfg);
    thickness = band_cfg_thickness(band_cfg);
    latch_clearance = latch_cfg_clearance(latch_cfg);
    positions = surface_positions(surface_cfg, length, width);

    if (mode == "modular") {
        socket_depth = min(thickness, surface_cfg_socket_depth(surface_cfg));
        socket_d = surface_socket_diameter(surface_cfg);

        for (p = positions)
            if (surface_position_is_clear(p, length, latch_clearance))
                translate([p[0], p[1], thickness - socket_depth])
                    cylinder(h = socket_depth + 0.1, d = socket_d);
    } else if (mode == "bare_with_holes") {
        for (p = positions)
            if (surface_position_is_clear(p, length, latch_clearance))
                translate([p[0], p[1], -0.1])
                    cylinder(
                        h = thickness + 0.2,
                        d = surface_cfg_hole_diameter(surface_cfg)
                    );
    }
}
// file: ../core/band.scad
// core/band.scad — bracelet substrate geometry.
// MIT licensed. See LICENSE-MIT.

include <config.scad>

// --- flat printable substrate ---------------------------------------------

module band_strip(length, width, thickness, corner = OPEN_STUDS_DEFAULT_CORNER) {
    linear_extrude(height = thickness)
        if (corner > 0)
            offset(r = corner) offset(delta = -corner)
                square([length, width], center = false);
        else
            square([length, width], center = false);
}

function band_relief_enabled(mode, thickness) =
    mode == "inside_slots" || mode == "slots" ||
    (mode == "auto" && thickness >= 3.6);

function band_relief_depth(thickness, relief_depth) =
    max(0, min(
        thickness - 0.6,
        is_undef(relief_depth) ? max(0, thickness - 1.2) : relief_depth
    ));

module band_flex_relief_cuts(
    length,
    width,
    thickness,
    relief_pitch       = 10,
    relief_width       = 1.2,
    relief_depth       = undef,
    relief_edge_margin = 2,
    relief_margin      = OPEN_STUDS_LATCH_MARGIN
) {
    depth = band_relief_depth(thickness, relief_depth);
    slot_y = relief_edge_margin;
    slot_width = max(0, width - 2 * relief_edge_margin);

    if (relief_pitch > 0 && relief_width > 0 && depth > 0 && slot_width > 0)
        for (x = [relief_margin : relief_pitch : length - relief_margin])
            translate([x - relief_width / 2, slot_y, -0.05])
                cube([relief_width, slot_width, depth + 0.1], center = false);
}

module bracelet_band(
    length,
    width,
    thickness,
    corner             = OPEN_STUDS_DEFAULT_CORNER,
    flex_relief        = "none",
    relief_pitch       = 10,
    relief_width       = 1.2,
    relief_depth       = undef,
    relief_edge_margin = 2,
    relief_margin      = OPEN_STUDS_LATCH_MARGIN
) {
    difference() {
        band_strip(length, width, thickness, corner);

        if (band_relief_enabled(flex_relief, thickness))
            band_flex_relief_cuts(
                length,
                width,
                thickness,
                relief_pitch,
                relief_width,
                relief_depth,
                relief_edge_margin,
                relief_margin
            );
    }
}

module bracelet_band_from_config(cfg) {
    bracelet_band(
        length             = band_cfg_length(cfg),
        width              = band_cfg_width(cfg),
        thickness          = band_cfg_thickness(cfg),
        corner             = band_cfg_corner(cfg),
        flex_relief        = band_cfg_flex_relief(cfg),
        relief_pitch       = band_cfg_relief_pitch(cfg),
        relief_width       = band_cfg_relief_width(cfg),
        relief_depth       = band_cfg_relief_depth(cfg),
        relief_edge_margin = band_cfg_relief_edge_margin(cfg),
        relief_margin      = band_cfg_relief_margin(cfg)
    );
}
// file: ../core/config.scad
// core/config.scad — grouped design configuration helpers.
// MIT licensed. See LICENSE-MIT.
//
// The public `studded_bracelet(...)` API stays flat for hand editing, but the
// assembly uses these grouped configs internally. They mirror the GitHub Pages
// configurator sections: band, surface, latch, and export stage.

OPEN_STUDS_FN = 48;

OPEN_STUDS_DEFAULT_CIRCUMFERENCE = 180;
OPEN_STUDS_DEFAULT_WIDTH         = 22;
OPEN_STUDS_DEFAULT_THICKNESS     = 3;
OPEN_STUDS_DEFAULT_CORNER        = 4;
OPEN_STUDS_LATCH_MARGIN          = 25;

OPEN_STUDS_DEFAULT_STUD          = "pyramid";
OPEN_STUDS_DEFAULT_PATTERN       = "single_row";
OPEN_STUDS_DEFAULT_ROWS          = 1;
OPEN_STUDS_DEFAULT_STUD_SIZE     = 6;
OPEN_STUDS_DEFAULT_TIP_RADIUS    = 0.4;

OPEN_STUDS_DEFAULT_SOCKET_DEPTH  = 1.5;
OPEN_STUDS_DEFAULT_HOLE_DIAMETER = 3;

// --- band config -----------------------------------------------------------

function band_config(
    circumference      = OPEN_STUDS_DEFAULT_CIRCUMFERENCE,
    width              = OPEN_STUDS_DEFAULT_WIDTH,
    thickness          = OPEN_STUDS_DEFAULT_THICKNESS,
    corner             = OPEN_STUDS_DEFAULT_CORNER,
    flex_relief        = "none",
    relief_pitch       = 10,
    relief_width       = 1.2,
    relief_depth       = undef,
    relief_edge_margin = 2,
    relief_margin      = OPEN_STUDS_LATCH_MARGIN
) = [
    circumference,
    width,
    thickness,
    corner,
    flex_relief,
    relief_pitch,
    relief_width,
    relief_depth,
    relief_edge_margin,
    relief_margin
];

function band_cfg_length(c)             = c[0];
function band_cfg_width(c)              = c[1];
function band_cfg_thickness(c)          = c[2];
function band_cfg_corner(c)             = c[3];
function band_cfg_flex_relief(c)        = c[4];
function band_cfg_relief_pitch(c)       = c[5];
function band_cfg_relief_width(c)       = c[6];
function band_cfg_relief_depth(c)       = c[7];
function band_cfg_relief_edge_margin(c) = c[8];
function band_cfg_relief_margin(c)      = c[9];

// --- surface config --------------------------------------------------------

function surface_config(
    mode            = "integral",
    stud_module     = OPEN_STUDS_DEFAULT_STUD,
    stud_pattern    = OPEN_STUDS_DEFAULT_PATTERN,
    stud_rows       = OPEN_STUDS_DEFAULT_ROWS,
    stud_size       = OPEN_STUDS_DEFAULT_STUD_SIZE,
    tip_radius      = OPEN_STUDS_DEFAULT_TIP_RADIUS,
    stud_spacing    = undef,
    socket_depth    = OPEN_STUDS_DEFAULT_SOCKET_DEPTH,
    socket_diameter = undef,
    hole_diameter   = OPEN_STUDS_DEFAULT_HOLE_DIAMETER
) = [
    mode,
    stud_module,
    stud_pattern,
    stud_rows,
    stud_size,
    tip_radius,
    stud_spacing,
    socket_depth,
    socket_diameter,
    hole_diameter
];

function surface_cfg_mode(c)            = c[0];
function surface_cfg_stud_module(c)     = c[1];
function surface_cfg_pattern(c)         = c[2];
function surface_cfg_rows(c)            = c[3];
function surface_cfg_stud_size(c)       = c[4];
function surface_cfg_tip_radius(c)      = c[5];
function surface_cfg_spacing(c)         = c[6];
function surface_cfg_socket_depth(c)    = c[7];
function surface_cfg_socket_diameter(c) = c[8];
function surface_cfg_hole_diameter(c)   = c[9];

// --- latch config ----------------------------------------------------------

function latch_config(
    type      = "buckle",
    clearance = OPEN_STUDS_LATCH_MARGIN
) = [
    type,
    clearance
];

function latch_cfg_type(c)      = c[0];
function latch_cfg_clearance(c) = c[1];

// --- export config ---------------------------------------------------------

function export_config(
    stage       = "print_flat",
    test_length = 70
) = [
    stage,
    test_length
];

function export_cfg_stage(c)       = c[0];
function export_cfg_test_length(c) = c[1];
// file: ../bracelet.scad
// open-studs — parametric studded bracelet, source-of-truth.
// MIT licensed. See LICENSE-MIT.
//
// Top-level entry points:
//   - studded_bracelet(...): flat, hand-editable compatibility API.
//   - bracelet_from_config(...): segmented band/surface/latch/export API.
//
// The bracelet is exported flat for printing. The GitHub Pages viewer can
// bend that same STL around a wrist for preview without changing the print
// orientation.
//
// Quick start:
//
//   use <bracelet.scad>
//   studded_bracelet(
//       circumference = 180, width = 22, thickness = 3,
//       stud_module = "long_spike", stud_pattern = "staggered",
//       stud_rows = 2, latch = "buckle", mode = "integral"
//   );

include <core/config.scad>

use <core/band.scad>
use <core/surface.scad>
use <core/latch.scad>

$fn = OPEN_STUDS_FN;

// Compatibility constant for older user files and pattern discussions.
LATCH_MARGIN = OPEN_STUDS_LATCH_MARGIN;

// --- assembly stages -------------------------------------------------------

module bracelet_from_config(
    band    = band_config(),
    surface = surface_config(),
    latch   = latch_config(),
    export  = export_config()
) {
    stage = export_cfg_stage(export);

    if (stage == "print_flat") {
        _bracelet_print_flat(band, surface, latch);
    } else if (stage == "band_only") {
        bracelet_band_from_config(band);
    } else if (stage == "surface_only") {
        _bracelet_surface_only(band, surface, latch);
    } else if (stage == "latch_only") {
        _bracelet_latch_test(band, latch, export);
    } else {
        echo(str(
            "WARN: unknown export stage '", stage,
            "'; valid: print_flat, band_only, surface_only, latch_only"
        ));
        _bracelet_print_flat(band, surface, latch);
    }
}

module _bracelet_print_flat(band, surface, latch) {
    difference() {
        union() {
            bracelet_band_from_config(band);
            bracelet_surface_from_config(surface, band, latch);
            bracelet_latch_from_config(latch, band);
        }

        bracelet_surface_cutouts_from_config(surface, band, latch);
    }
}

module _bracelet_surface_only(band, surface, latch) {
    difference() {
        union() {
            bracelet_band_from_config(band);
            bracelet_surface_from_config(surface, band, latch);
        }

        bracelet_surface_cutouts_from_config(surface, band, latch);
    }
}

module _bracelet_latch_test(band, latch, export) {
    test_band = band_config(
        circumference      = export_cfg_test_length(export),
        width              = band_cfg_width(band),
        thickness          = band_cfg_thickness(band),
        corner             = band_cfg_corner(band),
        flex_relief        = "none",
        relief_margin      = latch_cfg_clearance(latch)
    );

    union() {
        bracelet_band_from_config(test_band);
        bracelet_latch_from_config(latch, test_band);
    }
}

// --- public compatibility API ---------------------------------------------

module studded_bracelet(
    circumference      = OPEN_STUDS_DEFAULT_CIRCUMFERENCE,
    width              = OPEN_STUDS_DEFAULT_WIDTH,
    thickness          = OPEN_STUDS_DEFAULT_THICKNESS,
    stud_module        = OPEN_STUDS_DEFAULT_STUD,
    stud_pattern       = OPEN_STUDS_DEFAULT_PATTERN,
    stud_rows          = OPEN_STUDS_DEFAULT_ROWS,
    stud_size          = OPEN_STUDS_DEFAULT_STUD_SIZE,
    tip_radius         = OPEN_STUDS_DEFAULT_TIP_RADIUS,
    stud_spacing       = undef,
    latch              = "buckle",
    mode               = "integral",
    flex_relief        = "none",
    relief_pitch       = 10,
    relief_width       = 1.2,
    relief_depth       = undef,
    latch_clearance    = OPEN_STUDS_LATCH_MARGIN,
    stage              = "print_flat",
    test_length        = 70
) {
    band_cfg = band_config(
        circumference = circumference,
        width         = width,
        thickness     = thickness,
        flex_relief   = flex_relief,
        relief_pitch  = relief_pitch,
        relief_width  = relief_width,
        relief_depth  = relief_depth,
        relief_margin = latch_clearance
    );

    surface_cfg = surface_config(
        mode         = mode,
        stud_module  = stud_module,
        stud_pattern = stud_pattern,
        stud_rows    = stud_rows,
        stud_size    = stud_size,
        tip_radius   = tip_radius,
        stud_spacing = stud_spacing
    );

    latch_cfg = latch_config(
        type      = latch,
        clearance = latch_clearance
    );

    export_cfg = export_config(
        stage       = stage,
        test_length = test_length
    );

    bracelet_from_config(
        band    = band_cfg,
        surface = surface_cfg,
        latch   = latch_cfg,
        export  = export_cfg
    );
}

// --- default render --------------------------------------------------------

studded_bracelet(
    circumference = OPEN_STUDS_DEFAULT_CIRCUMFERENCE,
    width         = OPEN_STUDS_DEFAULT_WIDTH,
    thickness     = OPEN_STUDS_DEFAULT_THICKNESS,
    stud_module   = OPEN_STUDS_DEFAULT_STUD,
    stud_pattern  = OPEN_STUDS_DEFAULT_PATTERN,
    stud_rows     = OPEN_STUDS_DEFAULT_ROWS,
    latch         = "buckle",
    mode          = "integral"
);
// main file
// test_prints/flex_relief_strip.scad — thick-band underside relief coupon.
// MIT licensed. See LICENSE-MIT.

use <../bracelet.scad>

studded_bracelet(
    circumference   = 80,
    width           = 28,
    thickness       = 5,
    latch           = "none",
    mode            = "integral",
    flex_relief     = "inside_slots",
    relief_pitch    = 8,
    relief_width    = 1.2,
    relief_depth    = 3.8,
    latch_clearance = 8,
    stage           = "band_only"
);
